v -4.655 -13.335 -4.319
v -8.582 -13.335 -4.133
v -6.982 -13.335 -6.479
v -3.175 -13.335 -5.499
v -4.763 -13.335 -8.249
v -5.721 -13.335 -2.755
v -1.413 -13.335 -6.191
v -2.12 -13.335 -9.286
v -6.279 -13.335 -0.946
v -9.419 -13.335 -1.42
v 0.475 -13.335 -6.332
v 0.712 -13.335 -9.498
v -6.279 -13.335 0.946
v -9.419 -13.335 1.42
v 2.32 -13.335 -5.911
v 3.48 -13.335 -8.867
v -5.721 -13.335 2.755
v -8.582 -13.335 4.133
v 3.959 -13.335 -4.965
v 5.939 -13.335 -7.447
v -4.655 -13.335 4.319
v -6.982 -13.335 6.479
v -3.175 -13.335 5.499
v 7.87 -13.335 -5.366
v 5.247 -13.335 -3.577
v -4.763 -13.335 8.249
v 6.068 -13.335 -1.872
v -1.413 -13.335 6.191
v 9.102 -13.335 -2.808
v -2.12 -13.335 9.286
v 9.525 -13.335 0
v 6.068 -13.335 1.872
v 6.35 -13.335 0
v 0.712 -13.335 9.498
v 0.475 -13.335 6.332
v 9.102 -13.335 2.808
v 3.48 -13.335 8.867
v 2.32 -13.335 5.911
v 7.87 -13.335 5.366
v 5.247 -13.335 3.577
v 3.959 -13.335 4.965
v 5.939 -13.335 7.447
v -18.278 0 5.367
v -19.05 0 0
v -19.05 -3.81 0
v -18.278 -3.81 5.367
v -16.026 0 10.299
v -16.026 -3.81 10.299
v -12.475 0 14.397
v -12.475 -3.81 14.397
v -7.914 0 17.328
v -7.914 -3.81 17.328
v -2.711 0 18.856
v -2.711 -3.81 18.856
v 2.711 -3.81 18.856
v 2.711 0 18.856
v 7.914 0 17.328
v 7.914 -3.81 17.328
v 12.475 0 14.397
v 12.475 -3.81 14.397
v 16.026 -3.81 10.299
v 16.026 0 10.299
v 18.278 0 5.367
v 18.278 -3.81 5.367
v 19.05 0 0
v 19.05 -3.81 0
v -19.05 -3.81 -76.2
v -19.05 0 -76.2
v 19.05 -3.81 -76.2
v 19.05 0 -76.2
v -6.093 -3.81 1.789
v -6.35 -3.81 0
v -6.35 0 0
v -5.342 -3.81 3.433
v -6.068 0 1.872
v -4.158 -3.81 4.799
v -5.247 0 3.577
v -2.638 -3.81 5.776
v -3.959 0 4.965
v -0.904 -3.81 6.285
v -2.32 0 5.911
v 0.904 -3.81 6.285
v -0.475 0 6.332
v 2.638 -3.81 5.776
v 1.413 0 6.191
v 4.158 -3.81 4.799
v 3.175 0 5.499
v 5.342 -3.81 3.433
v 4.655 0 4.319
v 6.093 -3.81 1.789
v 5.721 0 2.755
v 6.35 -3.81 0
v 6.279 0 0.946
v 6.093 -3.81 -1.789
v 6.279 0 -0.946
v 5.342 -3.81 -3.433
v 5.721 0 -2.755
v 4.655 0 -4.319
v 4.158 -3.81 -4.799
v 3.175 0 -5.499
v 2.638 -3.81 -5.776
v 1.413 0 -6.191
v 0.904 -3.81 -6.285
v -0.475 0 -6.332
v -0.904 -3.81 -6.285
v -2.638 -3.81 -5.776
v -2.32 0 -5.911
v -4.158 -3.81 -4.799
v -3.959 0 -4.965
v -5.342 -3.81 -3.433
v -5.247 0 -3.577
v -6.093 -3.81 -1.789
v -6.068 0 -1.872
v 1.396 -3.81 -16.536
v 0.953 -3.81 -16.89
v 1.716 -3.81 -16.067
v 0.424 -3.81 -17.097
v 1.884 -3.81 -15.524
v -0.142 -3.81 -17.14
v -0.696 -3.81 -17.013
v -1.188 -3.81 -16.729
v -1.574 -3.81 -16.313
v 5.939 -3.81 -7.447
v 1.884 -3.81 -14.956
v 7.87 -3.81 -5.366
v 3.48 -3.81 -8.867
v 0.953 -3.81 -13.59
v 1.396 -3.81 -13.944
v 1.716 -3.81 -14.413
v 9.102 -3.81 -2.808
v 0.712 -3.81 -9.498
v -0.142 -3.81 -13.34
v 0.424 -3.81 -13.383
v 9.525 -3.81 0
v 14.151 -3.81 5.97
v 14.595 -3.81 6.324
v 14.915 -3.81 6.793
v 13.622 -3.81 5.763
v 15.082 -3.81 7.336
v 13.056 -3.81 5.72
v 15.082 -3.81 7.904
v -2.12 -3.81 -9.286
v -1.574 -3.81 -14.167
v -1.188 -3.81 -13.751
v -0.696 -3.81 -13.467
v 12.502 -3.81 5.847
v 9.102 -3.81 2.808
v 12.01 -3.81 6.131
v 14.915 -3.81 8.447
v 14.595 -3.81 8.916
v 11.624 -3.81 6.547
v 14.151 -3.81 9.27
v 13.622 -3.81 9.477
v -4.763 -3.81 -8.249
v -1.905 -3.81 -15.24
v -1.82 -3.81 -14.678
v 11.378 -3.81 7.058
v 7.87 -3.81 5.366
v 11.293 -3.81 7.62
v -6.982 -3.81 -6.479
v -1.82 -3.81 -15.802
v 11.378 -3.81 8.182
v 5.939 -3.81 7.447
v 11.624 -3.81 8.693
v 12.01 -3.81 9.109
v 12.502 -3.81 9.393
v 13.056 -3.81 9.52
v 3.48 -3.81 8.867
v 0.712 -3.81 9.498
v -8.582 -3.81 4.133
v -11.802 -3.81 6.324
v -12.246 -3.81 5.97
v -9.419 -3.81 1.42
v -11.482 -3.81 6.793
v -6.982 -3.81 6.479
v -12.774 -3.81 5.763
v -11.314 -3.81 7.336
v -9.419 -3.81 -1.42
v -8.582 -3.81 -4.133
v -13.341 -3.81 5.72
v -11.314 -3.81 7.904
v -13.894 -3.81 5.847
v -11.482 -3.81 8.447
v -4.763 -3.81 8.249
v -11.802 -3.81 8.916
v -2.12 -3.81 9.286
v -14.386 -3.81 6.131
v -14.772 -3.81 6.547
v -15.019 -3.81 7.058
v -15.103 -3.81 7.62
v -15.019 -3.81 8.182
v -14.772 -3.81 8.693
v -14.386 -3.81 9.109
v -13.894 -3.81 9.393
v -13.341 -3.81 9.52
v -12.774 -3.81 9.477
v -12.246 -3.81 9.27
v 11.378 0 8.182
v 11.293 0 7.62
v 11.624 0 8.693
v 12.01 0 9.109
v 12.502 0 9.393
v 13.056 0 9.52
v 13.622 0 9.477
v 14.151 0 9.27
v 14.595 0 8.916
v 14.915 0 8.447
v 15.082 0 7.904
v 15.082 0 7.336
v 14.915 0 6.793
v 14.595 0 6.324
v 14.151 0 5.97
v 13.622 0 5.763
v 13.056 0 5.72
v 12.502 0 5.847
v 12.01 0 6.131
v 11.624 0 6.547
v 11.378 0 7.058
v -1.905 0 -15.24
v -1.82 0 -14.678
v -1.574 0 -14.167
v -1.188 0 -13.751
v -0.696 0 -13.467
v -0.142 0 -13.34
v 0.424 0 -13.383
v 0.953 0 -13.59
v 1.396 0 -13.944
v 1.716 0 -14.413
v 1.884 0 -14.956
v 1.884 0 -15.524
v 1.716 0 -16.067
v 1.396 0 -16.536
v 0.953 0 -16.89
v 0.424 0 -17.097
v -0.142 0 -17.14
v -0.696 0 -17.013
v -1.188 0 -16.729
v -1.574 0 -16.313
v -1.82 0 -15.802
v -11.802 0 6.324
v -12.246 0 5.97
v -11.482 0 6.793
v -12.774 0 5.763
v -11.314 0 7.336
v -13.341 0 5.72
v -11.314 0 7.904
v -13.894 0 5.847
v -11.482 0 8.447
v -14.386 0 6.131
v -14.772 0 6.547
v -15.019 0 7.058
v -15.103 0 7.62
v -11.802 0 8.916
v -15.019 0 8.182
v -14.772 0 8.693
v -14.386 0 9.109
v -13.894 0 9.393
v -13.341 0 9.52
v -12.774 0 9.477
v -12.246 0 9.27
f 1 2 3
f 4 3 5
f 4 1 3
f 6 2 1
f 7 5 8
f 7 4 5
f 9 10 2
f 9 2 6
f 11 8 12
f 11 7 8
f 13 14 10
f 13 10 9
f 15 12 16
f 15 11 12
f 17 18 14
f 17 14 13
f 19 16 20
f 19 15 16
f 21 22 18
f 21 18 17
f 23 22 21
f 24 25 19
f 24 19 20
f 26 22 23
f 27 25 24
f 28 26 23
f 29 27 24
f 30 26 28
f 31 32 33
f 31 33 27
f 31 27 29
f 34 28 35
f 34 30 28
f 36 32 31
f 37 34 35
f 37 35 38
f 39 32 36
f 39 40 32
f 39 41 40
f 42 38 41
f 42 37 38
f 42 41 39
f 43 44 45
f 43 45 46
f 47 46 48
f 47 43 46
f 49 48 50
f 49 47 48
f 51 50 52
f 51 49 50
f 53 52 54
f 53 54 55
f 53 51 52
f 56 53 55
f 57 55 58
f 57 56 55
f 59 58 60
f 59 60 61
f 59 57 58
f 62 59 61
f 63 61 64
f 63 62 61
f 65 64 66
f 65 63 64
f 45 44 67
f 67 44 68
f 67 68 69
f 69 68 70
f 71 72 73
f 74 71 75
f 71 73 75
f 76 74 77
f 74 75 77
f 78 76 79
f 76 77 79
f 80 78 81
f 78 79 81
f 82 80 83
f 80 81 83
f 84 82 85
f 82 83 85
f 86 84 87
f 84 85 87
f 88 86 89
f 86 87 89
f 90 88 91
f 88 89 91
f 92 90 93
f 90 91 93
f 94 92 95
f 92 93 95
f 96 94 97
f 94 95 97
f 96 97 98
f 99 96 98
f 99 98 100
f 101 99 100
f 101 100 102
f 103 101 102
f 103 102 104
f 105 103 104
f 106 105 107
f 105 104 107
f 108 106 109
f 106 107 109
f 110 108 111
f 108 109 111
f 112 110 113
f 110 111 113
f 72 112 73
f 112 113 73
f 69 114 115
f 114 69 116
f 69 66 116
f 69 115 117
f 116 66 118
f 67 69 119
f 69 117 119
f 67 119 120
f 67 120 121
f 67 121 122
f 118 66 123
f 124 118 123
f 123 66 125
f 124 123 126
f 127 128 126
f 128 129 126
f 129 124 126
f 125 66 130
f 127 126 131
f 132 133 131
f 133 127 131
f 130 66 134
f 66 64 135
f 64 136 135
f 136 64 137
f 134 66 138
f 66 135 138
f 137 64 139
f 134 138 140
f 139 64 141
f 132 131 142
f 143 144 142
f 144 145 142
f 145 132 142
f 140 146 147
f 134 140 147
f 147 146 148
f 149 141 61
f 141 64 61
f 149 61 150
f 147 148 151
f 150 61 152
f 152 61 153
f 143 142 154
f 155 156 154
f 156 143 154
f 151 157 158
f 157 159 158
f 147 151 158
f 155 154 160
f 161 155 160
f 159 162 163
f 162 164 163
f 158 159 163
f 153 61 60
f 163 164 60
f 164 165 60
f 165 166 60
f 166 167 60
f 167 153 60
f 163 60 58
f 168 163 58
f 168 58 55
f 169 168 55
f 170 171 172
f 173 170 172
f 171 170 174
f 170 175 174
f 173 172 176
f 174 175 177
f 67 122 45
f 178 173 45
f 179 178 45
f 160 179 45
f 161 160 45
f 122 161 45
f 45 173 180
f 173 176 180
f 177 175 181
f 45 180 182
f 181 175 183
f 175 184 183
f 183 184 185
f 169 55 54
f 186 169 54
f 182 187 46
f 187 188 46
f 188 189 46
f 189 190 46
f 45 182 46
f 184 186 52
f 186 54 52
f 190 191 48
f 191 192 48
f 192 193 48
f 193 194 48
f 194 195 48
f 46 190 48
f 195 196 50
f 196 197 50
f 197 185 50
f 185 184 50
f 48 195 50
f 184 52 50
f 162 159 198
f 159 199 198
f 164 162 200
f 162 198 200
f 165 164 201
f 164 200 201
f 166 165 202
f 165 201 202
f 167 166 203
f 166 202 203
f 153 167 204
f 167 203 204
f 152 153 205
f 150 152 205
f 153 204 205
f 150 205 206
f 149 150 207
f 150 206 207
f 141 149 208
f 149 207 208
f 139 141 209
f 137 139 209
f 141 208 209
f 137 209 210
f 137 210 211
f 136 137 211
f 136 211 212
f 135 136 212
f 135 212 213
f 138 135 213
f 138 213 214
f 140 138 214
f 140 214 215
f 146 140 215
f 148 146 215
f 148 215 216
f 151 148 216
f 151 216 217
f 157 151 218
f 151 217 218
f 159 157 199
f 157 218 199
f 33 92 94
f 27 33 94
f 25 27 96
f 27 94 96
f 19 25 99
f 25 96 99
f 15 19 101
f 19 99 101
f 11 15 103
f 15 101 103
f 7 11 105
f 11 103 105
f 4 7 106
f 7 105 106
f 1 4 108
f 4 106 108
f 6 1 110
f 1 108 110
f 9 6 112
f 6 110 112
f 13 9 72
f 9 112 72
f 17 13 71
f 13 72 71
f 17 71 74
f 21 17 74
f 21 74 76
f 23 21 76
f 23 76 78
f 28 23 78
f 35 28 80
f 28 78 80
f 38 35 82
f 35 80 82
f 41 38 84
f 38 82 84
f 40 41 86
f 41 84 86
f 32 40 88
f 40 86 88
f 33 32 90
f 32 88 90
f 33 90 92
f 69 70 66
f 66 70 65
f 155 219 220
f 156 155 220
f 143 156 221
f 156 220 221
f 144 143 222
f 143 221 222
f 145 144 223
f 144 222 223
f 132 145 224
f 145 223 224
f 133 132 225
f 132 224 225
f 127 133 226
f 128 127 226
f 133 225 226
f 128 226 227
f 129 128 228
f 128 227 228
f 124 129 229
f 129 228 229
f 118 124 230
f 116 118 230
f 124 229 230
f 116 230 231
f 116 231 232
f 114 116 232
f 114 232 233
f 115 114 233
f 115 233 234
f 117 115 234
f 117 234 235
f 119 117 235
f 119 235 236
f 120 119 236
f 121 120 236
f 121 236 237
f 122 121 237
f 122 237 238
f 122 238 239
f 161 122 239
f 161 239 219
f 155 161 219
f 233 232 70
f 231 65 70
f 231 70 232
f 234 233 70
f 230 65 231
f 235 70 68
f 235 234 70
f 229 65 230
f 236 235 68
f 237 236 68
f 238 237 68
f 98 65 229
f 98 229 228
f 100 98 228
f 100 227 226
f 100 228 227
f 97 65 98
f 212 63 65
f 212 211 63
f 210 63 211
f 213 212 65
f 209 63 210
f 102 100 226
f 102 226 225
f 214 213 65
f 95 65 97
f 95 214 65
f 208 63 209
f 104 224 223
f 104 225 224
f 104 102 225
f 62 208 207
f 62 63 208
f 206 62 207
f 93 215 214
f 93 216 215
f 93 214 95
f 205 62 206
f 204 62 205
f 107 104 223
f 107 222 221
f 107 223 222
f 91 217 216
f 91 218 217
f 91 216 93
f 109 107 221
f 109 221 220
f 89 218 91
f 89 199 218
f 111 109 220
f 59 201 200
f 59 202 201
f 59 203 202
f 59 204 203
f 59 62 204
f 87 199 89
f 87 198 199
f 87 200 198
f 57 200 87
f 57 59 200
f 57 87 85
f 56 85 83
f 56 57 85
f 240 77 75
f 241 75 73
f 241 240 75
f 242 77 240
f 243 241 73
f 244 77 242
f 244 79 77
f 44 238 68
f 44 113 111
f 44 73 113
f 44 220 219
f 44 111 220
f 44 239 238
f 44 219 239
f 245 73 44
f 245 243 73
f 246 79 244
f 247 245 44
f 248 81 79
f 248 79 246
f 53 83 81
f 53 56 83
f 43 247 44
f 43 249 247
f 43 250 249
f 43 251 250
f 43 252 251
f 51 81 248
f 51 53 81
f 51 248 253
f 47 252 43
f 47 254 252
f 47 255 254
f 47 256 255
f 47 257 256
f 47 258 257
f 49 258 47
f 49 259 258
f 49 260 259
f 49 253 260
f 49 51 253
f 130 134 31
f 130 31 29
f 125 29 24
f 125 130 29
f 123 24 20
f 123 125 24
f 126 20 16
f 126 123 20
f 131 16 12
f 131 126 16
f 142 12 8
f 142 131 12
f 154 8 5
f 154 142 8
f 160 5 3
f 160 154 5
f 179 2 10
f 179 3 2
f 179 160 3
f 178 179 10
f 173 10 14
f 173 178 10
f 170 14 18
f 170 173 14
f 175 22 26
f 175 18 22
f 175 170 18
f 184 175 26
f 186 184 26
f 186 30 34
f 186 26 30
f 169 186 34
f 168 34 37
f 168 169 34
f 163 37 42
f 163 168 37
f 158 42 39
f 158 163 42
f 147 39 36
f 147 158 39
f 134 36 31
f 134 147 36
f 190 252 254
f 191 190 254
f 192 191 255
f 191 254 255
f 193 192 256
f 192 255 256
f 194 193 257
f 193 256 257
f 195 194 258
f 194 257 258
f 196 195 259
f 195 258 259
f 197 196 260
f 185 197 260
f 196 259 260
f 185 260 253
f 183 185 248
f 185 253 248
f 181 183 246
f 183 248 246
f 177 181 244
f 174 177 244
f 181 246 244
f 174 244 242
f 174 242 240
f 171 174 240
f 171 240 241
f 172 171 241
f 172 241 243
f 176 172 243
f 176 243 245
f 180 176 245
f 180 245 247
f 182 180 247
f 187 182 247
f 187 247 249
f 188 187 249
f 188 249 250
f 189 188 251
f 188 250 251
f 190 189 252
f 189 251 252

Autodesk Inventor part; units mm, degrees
ref_plane "YZ Plane" through (0, 0, 0) normal (1, 0, 0) x (0, 1, 0)
ref_plane "XZ Plane" through (0, 0, 0) normal (0, 1, 0) x (-1, 0, 0)
ref_plane "XY Plane" through (0, 0, 0) normal (0, 0, 1) x (1, 0, 0)
sketch "Sketch1" plane through (0, 0, 0) normal (0, 1, 0) x (-1, 0, 0)
  circle A0 centre (0, 0) radius 15.24 construction
  circle A1 centre (0, -15.24) radius 1.905
  circle A2 centre (13.1982, 7.62) radius 1.905
  circle A3 centre (-13.1982, 7.62) radius 1.905
  arc A4 (19.05, 0) -> (-19.05, 0) centre (0, 0) ccw
  line L0 (19.05, 0) -> (19.05, -76.2)
  line L1 (19.05, -76.2) -> (-19.05, -76.2)
  line L2 (-19.05, -76.2) -> (-19.05, 0)
  circle A5 centre (0, 0) radius 6.35
  point P0 (0, -19.05)
  point P1 (0, 19.05)
  dimension "boltHoleDiameter" = 30.48
  dimension "d1" = 3.81
  dimension "d4" = 360
  dimension "exteriorOfBolts" = 38.1
  dimension "majorLength" = 76.2
  dimension "d12" = 12.7
extrude "Extrusion2" add sketch "Sketch1" against normal blind 3.81
sketch "Sketch2" plane through (0, -3.81, 0) normal (0, -1, 0) x (1, 0, 0)
  circle A0 centre (0, 0) radius 6.35
  circle A1 centre (0, 0) radius 9.525
  dimension "d15" = 19.05
extrude "Extrusion3" add sketch "Sketch2" along normal blind 9.525
properties part number "Focuser Base"
